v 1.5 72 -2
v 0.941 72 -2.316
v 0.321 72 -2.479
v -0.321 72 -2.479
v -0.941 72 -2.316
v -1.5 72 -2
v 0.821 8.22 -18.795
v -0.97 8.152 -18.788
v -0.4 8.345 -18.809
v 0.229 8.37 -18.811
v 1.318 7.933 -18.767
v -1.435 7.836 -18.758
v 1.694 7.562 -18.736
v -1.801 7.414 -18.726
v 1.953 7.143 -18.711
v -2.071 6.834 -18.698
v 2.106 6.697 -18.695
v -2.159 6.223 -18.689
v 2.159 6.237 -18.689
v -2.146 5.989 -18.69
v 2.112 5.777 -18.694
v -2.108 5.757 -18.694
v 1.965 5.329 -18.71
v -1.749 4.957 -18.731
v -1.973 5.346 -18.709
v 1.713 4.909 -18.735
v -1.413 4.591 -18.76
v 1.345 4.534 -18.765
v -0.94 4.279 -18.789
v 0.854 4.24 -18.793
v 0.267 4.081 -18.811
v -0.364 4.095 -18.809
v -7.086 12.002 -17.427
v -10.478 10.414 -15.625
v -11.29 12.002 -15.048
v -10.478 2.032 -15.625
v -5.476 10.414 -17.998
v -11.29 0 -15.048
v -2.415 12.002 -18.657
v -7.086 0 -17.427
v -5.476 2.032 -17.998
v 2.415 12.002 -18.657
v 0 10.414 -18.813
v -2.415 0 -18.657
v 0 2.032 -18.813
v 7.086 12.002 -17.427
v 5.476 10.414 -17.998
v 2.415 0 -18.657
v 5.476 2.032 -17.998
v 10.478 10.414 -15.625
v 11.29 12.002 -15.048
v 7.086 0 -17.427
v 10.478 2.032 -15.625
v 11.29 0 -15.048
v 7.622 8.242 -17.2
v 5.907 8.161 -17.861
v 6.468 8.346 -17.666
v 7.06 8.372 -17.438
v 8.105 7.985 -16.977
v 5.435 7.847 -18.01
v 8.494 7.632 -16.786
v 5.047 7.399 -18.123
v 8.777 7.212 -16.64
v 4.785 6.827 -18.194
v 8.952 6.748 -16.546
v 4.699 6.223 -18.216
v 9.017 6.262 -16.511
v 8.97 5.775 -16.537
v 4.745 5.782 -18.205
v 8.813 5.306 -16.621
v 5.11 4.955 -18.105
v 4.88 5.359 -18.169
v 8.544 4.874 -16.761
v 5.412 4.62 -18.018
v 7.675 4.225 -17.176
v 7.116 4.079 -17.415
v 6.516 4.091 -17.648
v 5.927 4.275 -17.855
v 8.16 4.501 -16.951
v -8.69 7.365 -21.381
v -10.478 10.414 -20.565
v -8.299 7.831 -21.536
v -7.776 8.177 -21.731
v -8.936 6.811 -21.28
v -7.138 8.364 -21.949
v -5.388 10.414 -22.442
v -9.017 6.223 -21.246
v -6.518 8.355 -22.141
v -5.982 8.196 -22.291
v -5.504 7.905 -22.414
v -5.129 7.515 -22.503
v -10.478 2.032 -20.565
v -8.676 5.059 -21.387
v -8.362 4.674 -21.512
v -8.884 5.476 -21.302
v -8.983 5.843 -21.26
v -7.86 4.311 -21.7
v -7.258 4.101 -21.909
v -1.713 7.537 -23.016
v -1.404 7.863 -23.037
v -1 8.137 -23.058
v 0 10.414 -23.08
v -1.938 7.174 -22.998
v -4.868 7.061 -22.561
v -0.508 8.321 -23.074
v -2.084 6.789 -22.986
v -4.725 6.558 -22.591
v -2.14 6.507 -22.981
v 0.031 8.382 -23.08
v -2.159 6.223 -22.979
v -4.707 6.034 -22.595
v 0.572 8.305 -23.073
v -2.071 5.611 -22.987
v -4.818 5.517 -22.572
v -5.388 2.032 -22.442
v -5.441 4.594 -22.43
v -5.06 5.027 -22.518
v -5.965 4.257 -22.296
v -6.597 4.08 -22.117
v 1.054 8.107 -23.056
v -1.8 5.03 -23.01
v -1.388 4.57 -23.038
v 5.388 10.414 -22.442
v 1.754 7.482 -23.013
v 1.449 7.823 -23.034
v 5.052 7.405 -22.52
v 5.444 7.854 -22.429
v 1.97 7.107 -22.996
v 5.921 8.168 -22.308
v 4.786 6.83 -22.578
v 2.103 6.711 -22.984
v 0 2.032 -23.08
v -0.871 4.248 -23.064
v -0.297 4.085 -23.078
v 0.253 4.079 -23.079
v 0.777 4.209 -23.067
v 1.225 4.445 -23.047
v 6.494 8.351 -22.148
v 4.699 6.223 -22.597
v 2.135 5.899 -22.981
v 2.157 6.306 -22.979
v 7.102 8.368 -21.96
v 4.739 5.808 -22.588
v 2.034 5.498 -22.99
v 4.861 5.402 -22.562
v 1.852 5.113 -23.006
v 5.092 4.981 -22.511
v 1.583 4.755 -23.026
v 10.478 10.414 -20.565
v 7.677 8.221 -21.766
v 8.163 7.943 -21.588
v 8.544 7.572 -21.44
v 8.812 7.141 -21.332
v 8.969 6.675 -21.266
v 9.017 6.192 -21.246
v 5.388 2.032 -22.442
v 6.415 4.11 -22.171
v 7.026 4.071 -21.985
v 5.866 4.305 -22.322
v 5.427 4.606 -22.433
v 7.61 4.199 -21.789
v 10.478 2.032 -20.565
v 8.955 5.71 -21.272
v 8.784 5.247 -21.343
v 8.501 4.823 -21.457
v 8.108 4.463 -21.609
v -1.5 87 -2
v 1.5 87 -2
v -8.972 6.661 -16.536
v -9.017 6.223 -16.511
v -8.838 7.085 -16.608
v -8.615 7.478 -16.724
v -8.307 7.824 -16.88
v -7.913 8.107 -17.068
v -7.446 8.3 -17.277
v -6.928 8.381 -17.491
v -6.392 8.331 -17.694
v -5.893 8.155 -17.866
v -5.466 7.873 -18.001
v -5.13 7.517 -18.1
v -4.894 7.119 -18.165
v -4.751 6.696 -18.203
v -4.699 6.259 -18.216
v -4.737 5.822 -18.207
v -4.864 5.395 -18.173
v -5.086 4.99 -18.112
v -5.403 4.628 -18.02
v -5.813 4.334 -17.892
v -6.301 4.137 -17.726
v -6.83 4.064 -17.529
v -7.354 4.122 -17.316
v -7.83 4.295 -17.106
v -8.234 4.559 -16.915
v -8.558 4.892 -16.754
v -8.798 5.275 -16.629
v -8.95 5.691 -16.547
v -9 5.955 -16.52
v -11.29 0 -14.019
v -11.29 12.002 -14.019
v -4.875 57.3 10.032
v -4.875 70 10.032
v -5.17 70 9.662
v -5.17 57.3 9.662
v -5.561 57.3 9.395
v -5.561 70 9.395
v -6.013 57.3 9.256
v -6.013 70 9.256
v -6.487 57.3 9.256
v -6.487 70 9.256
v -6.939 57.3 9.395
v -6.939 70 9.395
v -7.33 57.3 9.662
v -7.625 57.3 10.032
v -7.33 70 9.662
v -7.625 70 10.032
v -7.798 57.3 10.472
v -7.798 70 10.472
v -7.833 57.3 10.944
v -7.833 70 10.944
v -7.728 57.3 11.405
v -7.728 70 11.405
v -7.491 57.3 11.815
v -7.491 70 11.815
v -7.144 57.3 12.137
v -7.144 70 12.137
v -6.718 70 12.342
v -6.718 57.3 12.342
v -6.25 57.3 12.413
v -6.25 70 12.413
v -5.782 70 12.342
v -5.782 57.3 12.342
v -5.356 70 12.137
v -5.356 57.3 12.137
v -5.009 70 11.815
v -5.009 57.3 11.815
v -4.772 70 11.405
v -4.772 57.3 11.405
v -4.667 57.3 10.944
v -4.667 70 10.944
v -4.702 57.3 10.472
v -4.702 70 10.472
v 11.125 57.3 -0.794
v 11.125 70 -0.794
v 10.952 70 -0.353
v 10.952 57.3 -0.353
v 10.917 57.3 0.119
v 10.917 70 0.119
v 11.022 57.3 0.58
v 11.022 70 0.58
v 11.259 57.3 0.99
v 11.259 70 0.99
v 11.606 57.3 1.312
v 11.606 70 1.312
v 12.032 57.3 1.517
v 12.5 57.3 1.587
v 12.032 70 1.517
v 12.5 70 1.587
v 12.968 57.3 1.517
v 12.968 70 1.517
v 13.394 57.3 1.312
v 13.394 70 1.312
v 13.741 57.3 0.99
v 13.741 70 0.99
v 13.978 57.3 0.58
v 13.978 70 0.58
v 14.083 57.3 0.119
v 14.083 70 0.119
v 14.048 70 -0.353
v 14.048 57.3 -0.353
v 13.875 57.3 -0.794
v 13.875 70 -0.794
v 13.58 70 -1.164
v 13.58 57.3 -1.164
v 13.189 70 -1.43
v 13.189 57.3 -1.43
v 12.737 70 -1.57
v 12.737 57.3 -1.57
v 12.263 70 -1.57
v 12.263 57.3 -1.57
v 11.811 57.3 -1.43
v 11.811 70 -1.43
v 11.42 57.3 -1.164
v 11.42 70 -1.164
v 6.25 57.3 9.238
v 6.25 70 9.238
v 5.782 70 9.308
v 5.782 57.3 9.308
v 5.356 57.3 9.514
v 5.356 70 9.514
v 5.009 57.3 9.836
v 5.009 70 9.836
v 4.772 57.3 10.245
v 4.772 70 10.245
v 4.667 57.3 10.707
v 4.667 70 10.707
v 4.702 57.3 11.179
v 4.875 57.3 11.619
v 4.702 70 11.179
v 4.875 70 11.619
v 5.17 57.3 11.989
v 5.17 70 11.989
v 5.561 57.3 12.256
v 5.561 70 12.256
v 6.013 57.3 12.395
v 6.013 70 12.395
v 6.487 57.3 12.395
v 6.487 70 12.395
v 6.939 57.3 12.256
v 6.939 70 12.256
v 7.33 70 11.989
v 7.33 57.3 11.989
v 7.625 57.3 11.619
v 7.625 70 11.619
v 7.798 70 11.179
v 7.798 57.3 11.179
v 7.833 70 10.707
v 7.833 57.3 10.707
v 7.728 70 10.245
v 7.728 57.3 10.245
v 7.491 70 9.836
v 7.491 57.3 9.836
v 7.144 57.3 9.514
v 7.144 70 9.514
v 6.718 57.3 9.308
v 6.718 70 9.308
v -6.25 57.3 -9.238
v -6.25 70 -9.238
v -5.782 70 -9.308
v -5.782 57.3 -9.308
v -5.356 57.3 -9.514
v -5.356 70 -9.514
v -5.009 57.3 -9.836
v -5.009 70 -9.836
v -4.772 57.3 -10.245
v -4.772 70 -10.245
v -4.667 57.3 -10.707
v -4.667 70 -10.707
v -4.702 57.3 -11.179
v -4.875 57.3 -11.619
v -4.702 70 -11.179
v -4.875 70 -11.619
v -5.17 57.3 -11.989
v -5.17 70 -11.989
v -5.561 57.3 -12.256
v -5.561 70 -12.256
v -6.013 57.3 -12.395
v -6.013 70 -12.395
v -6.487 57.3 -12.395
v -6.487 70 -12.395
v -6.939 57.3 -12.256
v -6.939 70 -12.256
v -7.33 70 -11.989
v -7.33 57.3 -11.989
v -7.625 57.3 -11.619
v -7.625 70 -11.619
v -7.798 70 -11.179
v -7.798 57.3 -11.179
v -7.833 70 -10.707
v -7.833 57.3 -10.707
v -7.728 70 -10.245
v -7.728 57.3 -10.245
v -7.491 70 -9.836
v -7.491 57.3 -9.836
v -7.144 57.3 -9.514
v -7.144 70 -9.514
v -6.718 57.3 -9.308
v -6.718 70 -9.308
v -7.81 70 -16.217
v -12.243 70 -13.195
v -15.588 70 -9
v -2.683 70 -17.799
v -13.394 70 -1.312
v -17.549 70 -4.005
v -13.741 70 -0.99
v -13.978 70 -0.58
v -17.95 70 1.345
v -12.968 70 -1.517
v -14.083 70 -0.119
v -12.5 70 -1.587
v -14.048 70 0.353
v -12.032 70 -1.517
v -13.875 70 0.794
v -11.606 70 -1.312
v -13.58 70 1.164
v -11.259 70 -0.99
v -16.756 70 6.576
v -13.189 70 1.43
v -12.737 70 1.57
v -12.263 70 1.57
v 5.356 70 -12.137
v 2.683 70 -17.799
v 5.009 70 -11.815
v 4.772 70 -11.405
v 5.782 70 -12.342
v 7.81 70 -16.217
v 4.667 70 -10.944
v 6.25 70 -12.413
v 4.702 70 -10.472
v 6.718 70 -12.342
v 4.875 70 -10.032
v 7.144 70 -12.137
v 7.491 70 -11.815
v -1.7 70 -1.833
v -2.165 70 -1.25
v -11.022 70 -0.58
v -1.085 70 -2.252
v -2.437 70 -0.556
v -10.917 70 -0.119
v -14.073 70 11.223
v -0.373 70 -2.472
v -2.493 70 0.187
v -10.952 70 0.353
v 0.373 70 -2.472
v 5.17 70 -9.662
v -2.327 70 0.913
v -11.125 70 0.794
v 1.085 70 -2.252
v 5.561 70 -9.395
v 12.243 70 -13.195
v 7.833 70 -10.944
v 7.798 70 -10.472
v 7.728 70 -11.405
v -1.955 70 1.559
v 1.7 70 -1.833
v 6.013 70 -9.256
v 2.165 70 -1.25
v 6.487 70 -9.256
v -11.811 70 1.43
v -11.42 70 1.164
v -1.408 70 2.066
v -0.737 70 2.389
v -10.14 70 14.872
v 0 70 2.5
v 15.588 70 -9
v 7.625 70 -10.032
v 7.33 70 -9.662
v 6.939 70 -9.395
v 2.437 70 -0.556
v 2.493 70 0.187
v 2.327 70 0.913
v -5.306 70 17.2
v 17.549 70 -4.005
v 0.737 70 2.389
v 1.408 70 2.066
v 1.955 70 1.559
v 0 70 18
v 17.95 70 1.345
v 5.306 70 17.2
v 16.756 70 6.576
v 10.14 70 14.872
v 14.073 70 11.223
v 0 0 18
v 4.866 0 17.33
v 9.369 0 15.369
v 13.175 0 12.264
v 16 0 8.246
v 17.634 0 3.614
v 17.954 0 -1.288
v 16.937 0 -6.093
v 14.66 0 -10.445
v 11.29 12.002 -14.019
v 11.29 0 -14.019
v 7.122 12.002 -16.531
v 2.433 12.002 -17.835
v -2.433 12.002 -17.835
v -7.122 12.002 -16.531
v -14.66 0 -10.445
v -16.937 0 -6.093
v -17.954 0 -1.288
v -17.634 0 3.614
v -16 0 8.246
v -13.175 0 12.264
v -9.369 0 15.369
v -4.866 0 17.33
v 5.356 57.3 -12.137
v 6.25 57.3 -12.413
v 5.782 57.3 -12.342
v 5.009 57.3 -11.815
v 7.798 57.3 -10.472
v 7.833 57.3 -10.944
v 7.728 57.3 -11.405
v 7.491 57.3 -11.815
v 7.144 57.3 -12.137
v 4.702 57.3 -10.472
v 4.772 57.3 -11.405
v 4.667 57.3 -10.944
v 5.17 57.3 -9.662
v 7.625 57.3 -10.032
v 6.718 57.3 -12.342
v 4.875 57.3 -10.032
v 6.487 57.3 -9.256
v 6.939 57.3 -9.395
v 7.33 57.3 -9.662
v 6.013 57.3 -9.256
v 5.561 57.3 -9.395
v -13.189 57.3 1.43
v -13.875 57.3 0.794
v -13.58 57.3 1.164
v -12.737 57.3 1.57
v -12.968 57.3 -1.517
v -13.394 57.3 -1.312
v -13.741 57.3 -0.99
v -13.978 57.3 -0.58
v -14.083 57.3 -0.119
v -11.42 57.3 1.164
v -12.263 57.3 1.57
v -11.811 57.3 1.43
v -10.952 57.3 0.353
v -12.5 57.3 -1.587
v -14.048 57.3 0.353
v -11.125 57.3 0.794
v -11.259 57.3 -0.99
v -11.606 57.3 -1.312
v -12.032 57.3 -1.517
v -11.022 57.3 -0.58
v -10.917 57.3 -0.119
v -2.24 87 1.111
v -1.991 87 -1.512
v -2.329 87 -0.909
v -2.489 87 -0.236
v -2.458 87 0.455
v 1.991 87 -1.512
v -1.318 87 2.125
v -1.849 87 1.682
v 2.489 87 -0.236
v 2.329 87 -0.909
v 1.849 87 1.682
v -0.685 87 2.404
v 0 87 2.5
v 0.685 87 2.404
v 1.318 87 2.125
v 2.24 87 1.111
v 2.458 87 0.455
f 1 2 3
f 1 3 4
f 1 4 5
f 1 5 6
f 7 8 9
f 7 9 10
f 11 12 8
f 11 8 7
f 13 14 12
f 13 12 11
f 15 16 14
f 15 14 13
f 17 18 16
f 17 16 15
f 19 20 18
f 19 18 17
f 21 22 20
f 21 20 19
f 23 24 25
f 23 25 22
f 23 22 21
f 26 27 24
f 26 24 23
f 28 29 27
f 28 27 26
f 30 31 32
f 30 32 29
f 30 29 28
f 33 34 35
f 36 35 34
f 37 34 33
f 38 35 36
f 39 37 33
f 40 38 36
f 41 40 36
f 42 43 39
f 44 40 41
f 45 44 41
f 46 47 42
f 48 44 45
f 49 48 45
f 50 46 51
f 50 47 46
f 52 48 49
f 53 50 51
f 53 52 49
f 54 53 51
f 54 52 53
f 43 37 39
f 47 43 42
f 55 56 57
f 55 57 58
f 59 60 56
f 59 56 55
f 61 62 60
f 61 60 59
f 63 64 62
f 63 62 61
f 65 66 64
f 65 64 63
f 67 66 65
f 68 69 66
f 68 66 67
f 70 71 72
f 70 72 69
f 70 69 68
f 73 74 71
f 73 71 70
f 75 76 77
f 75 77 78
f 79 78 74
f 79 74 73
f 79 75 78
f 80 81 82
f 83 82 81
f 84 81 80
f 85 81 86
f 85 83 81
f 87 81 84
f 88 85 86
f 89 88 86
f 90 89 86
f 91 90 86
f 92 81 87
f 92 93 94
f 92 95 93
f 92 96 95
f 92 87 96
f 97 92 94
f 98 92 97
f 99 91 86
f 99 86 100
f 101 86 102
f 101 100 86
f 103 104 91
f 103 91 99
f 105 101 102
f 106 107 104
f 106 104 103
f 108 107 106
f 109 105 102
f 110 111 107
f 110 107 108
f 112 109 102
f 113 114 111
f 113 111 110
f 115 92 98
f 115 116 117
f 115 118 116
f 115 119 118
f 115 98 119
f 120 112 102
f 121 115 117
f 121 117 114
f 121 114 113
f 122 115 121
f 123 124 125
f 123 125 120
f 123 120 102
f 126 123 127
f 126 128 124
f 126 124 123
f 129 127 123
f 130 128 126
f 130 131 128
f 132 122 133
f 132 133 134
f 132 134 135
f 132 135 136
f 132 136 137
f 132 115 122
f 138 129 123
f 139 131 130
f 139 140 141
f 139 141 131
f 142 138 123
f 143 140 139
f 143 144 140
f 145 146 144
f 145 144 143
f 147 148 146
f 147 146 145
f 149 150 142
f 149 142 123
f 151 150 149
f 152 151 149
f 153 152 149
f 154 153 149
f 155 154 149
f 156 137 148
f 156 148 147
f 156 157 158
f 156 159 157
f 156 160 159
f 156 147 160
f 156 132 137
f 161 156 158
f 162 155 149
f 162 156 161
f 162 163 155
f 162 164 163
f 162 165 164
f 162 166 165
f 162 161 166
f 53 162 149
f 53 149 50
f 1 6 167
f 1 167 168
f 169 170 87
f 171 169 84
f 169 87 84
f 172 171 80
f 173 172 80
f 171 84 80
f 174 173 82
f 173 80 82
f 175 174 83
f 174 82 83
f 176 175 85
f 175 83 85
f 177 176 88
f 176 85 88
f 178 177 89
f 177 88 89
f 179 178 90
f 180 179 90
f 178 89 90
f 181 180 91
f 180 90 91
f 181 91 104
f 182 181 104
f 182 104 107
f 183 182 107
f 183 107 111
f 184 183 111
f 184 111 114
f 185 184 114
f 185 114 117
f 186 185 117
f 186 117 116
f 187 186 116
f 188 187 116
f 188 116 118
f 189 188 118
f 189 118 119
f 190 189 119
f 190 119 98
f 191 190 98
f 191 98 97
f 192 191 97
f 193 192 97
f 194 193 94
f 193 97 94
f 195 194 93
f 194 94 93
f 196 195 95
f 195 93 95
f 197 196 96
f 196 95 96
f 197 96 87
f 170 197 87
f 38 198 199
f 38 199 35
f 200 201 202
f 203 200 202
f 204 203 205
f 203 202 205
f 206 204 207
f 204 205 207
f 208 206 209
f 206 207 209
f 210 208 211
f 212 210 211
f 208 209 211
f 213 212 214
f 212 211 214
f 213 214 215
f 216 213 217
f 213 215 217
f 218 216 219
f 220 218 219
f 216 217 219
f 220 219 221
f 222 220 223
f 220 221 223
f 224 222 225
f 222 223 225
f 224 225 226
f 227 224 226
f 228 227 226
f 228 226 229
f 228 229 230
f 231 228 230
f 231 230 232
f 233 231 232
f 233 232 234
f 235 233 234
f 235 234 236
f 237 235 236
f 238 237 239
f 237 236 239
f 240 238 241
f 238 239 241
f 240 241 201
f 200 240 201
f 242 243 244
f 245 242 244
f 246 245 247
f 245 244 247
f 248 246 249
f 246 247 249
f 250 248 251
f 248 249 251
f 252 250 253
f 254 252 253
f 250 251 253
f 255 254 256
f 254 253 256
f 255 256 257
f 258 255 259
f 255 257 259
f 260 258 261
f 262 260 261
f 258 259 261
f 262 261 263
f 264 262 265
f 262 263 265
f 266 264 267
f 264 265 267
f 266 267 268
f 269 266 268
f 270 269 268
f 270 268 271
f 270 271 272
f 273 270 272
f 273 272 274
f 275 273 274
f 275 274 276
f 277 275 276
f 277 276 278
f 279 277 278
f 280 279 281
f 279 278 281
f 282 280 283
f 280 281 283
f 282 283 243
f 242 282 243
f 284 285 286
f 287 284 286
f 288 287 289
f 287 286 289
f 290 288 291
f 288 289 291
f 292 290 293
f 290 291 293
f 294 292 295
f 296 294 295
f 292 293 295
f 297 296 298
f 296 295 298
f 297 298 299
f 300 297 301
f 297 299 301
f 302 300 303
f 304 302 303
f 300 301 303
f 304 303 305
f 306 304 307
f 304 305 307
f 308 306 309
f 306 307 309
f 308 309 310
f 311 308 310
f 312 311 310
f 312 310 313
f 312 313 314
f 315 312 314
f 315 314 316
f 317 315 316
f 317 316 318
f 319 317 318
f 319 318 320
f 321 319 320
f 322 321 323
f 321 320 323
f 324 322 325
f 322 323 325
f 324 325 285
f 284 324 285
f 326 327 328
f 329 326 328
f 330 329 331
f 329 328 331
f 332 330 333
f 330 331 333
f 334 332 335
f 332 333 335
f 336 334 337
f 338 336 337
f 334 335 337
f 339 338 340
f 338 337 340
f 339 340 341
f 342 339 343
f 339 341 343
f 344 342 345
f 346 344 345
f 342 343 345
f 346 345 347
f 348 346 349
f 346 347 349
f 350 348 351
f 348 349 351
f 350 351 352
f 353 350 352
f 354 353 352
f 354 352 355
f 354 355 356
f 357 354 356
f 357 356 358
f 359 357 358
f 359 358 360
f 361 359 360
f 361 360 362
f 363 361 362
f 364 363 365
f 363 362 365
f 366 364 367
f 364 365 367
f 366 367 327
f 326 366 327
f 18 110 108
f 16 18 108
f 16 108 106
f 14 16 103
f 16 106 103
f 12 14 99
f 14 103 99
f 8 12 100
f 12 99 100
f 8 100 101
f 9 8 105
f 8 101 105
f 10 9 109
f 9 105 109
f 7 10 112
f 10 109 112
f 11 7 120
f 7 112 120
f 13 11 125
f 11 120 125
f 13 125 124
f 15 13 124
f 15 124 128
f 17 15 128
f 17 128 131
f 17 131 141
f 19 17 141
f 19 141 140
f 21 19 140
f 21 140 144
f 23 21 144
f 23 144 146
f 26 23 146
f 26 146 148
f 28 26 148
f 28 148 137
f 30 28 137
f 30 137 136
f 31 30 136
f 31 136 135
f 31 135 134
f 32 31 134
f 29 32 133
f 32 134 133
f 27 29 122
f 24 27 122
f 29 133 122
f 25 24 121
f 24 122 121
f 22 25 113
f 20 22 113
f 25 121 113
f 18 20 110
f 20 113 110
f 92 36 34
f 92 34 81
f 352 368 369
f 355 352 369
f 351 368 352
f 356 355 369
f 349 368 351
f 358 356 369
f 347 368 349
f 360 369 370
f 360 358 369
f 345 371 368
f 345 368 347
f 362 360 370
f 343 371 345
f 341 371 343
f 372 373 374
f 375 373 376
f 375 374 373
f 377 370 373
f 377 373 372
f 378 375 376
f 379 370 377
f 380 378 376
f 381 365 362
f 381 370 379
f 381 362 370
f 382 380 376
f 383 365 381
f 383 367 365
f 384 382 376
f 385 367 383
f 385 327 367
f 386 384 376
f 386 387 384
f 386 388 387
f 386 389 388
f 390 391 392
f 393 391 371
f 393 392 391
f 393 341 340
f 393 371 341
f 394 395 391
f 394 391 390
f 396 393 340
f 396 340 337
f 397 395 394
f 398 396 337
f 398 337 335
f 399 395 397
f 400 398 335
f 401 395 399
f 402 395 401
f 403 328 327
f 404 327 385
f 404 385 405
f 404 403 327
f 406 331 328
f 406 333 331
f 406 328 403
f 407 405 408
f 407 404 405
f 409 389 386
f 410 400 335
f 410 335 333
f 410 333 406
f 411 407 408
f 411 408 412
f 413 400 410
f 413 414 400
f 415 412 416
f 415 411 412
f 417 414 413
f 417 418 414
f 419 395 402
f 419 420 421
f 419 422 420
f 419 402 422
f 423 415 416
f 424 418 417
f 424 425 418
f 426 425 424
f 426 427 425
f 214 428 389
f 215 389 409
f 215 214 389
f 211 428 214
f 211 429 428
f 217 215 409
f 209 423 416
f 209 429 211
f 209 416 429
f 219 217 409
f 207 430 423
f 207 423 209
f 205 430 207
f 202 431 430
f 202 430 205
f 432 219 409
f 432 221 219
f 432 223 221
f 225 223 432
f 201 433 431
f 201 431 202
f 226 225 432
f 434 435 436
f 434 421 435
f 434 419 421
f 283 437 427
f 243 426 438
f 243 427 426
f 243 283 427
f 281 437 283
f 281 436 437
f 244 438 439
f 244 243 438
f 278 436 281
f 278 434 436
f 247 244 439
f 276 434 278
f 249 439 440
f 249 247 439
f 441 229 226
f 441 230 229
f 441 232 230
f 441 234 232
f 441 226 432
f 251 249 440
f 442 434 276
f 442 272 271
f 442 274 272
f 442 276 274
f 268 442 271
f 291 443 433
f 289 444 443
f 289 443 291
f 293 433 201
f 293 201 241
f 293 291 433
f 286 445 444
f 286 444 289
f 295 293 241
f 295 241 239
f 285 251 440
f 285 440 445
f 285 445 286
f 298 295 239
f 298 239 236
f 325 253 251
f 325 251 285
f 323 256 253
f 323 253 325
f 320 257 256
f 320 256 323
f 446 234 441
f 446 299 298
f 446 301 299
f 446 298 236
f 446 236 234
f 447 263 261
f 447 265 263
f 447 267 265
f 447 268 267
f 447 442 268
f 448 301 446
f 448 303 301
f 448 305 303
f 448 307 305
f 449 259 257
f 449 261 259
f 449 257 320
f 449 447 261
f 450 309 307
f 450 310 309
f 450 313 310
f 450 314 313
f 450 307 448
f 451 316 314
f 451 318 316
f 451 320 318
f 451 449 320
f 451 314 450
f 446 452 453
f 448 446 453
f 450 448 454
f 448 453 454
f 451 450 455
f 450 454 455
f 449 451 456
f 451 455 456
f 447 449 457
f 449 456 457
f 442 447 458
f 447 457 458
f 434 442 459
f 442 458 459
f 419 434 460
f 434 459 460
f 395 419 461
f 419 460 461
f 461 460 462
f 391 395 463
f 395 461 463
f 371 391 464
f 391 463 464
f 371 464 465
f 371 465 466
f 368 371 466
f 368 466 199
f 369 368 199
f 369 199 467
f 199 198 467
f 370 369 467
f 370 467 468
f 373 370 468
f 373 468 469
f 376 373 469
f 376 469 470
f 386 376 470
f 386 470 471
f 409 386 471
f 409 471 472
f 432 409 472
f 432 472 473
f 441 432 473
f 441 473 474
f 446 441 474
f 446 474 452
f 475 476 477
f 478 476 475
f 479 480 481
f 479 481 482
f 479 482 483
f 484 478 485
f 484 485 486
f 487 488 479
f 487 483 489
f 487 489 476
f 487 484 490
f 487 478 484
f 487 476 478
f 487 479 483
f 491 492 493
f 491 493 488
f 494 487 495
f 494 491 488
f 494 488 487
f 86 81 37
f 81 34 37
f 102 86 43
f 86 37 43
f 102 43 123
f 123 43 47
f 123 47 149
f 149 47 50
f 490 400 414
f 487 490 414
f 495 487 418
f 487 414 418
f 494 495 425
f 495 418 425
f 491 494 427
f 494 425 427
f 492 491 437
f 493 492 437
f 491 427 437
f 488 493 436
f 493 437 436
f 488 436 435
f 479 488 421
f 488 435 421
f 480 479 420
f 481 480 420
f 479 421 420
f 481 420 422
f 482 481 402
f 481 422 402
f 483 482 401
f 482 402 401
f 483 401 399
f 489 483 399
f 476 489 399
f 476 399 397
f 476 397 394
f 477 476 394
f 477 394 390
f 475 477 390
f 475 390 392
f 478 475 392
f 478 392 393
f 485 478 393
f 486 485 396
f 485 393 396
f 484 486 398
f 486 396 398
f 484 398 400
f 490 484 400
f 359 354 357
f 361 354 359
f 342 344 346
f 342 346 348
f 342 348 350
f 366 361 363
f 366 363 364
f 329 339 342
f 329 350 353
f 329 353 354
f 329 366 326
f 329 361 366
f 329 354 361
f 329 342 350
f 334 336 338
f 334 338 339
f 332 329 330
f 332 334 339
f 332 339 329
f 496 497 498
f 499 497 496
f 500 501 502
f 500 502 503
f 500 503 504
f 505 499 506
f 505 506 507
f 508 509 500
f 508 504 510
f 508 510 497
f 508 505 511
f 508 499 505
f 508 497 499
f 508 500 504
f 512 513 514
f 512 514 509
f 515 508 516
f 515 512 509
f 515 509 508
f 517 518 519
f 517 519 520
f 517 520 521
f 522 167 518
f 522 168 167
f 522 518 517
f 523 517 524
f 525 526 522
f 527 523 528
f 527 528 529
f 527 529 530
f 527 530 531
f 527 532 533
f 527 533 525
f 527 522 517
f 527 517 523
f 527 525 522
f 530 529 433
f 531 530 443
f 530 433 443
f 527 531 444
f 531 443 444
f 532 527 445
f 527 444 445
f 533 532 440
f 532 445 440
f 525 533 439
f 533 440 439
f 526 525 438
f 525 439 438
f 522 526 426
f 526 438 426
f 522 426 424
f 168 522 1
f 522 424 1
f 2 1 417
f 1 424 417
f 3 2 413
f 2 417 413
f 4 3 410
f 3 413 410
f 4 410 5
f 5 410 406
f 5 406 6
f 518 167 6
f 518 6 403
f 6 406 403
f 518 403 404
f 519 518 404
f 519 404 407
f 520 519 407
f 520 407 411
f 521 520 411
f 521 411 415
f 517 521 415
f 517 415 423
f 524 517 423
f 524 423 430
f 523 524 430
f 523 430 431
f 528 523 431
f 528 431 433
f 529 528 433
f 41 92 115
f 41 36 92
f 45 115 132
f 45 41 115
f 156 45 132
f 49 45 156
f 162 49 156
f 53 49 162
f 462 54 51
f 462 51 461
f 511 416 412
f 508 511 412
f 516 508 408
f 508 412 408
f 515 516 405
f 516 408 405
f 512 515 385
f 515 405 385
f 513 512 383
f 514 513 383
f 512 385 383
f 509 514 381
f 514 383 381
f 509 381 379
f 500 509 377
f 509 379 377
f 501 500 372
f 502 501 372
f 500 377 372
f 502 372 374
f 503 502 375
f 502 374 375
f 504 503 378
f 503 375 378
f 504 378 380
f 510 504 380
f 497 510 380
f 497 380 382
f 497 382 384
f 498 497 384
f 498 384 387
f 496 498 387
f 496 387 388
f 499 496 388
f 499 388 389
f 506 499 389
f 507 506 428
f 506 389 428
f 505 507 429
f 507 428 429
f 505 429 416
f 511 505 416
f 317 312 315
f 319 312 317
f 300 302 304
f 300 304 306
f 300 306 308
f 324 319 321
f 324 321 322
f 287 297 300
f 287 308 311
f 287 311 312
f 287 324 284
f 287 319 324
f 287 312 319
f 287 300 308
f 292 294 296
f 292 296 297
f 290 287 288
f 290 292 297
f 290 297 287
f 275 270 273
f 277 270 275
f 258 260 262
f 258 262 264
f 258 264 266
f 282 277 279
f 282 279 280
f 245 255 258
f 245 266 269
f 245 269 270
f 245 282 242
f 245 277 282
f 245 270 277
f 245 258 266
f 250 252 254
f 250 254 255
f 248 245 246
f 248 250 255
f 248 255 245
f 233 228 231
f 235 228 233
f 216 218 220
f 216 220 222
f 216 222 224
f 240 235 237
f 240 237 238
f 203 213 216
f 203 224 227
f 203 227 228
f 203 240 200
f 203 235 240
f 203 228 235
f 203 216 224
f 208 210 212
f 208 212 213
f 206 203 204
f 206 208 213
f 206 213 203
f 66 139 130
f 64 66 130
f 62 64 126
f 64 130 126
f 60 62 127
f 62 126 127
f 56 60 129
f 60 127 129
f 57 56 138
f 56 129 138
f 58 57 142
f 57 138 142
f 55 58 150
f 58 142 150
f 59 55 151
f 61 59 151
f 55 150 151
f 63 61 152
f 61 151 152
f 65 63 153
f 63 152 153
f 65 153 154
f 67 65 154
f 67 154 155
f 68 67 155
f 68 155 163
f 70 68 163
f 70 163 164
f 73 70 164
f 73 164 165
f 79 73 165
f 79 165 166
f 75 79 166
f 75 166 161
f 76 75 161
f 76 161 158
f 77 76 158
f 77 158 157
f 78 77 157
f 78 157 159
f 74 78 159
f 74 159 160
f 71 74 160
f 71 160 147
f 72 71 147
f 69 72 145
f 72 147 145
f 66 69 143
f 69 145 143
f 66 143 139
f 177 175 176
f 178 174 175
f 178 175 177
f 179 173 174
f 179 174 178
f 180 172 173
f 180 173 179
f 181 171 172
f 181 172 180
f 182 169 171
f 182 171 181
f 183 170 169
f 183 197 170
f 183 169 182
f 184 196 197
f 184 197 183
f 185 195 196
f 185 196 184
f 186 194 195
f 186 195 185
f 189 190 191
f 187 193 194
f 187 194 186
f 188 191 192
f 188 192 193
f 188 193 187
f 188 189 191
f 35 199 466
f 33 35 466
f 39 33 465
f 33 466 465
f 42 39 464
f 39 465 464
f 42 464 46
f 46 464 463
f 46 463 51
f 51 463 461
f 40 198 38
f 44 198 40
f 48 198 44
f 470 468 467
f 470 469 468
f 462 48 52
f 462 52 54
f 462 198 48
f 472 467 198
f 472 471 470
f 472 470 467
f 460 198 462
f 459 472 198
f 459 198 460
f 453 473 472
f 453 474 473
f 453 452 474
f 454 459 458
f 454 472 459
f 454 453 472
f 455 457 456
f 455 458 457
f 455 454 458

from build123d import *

# Parameters (mm, degrees)
SKETCH1_R               = 18
BOSS_EXTRUDE1_DEPTH     = 70
SKETCH2_R               = 2.5
BOSS_EXTRUDE2_DEPTH     = 17
CUT_EXTRUDE1_START      = -15
CUT_EXTRUDE1_DEPTH      = 15
SKETCH4_R               = 1.5875
CUT_EXTRUDE2_DEPTH      = 12.7
CIRPATTERN1_COUNT       = 6
BOSS_EXTRUDE3_START     = -2.032
BOSS_EXTRUDE3_DEPTH     = 8.382
BOSS_EXTRUDE4_DEPTH     = 12.0015
CUT_EXTRUDE3_REACH      = 99.88
CUT_EXTRUDE3_END_RADIUS = 18.8128
SKETCH7_R               = 2.159


with BuildPart() as part:
    # Sketch1 → Boss-Extrude1 (new body)
    with BuildSketch(Plane(origin=(0, 0, 0), x_dir=(1, 0, 0), z_dir=(0, 1, 0))):
        with Locations(Location((0, 0, 0), (0, 0, 270))):
            Circle(SKETCH1_R)
    extrude(amount=BOSS_EXTRUDE1_DEPTH)

    # Sketch2 → Boss-Extrude2 (add)
    with BuildSketch(Plane(origin=(0, 70, 0), x_dir=(1, 0, 0), z_dir=(0, 1, 0))):
        with Locations(Location((0, 0, 0), (0, 0, 270))):
            Circle(SKETCH2_R)
    extrude(amount=BOSS_EXTRUDE2_DEPTH)

    # Sketch3 → Cut-Extrude1 (cut)
    with BuildSketch(Plane(origin=(0, 87, 0), x_dir=(1, 0, 0), z_dir=(0, 1, 0)).offset(CUT_EXTRUDE1_START)):
        with BuildLine():
            Line((-1.5, 2), (1.5, 2))
            ThreePointArc((1.5, 2), (0, 2.5), (-1.5, 2))
        make_face()
    extrude(amount=CUT_EXTRUDE1_DEPTH, mode=Mode.SUBTRACT)

    # Sketch4 → Cut-Extrude2 (cut)
    with BuildSketch(Plane(origin=(0, 70, 0), x_dir=(1, 0, 0), z_dir=(0, 1, 0))):
        with Locations(Location((-6.25, 10.825317547, 0), (0, 0, 270))):
            Circle(SKETCH4_R)
    cut_extrude2 = extrude(amount=-CUT_EXTRUDE2_DEPTH, mode=Mode.SUBTRACT)

    # CirPattern1: Cut-Extrude2 ×6 about axis
    cirpattern1_axis = Axis((0, 0, 0), (0, 1, 0))
    for i in range(1, CIRPATTERN1_COUNT):
        add(cut_extrude2.rotate(cirpattern1_axis, i * 360 / CIRPATTERN1_COUNT), mode=Mode.SUBTRACT)

    # Sketch5 → Boss-Extrude3 (add)
    with BuildSketch(Plane.XZ.offset(BOSS_EXTRUDE3_START)):
        with BuildLine():
            Line((10.4775, -20.564736656), (10.4775, -14.636324462))
            ThreePointArc((10.4775, -14.636324462), (0, -18), (-10.4775, -14.636324462))
            Line((-10.4775, -14.636324462), (-10.4775, -20.564736656))
            ThreePointArc((-10.4775, -20.564736656), (0, -23.08), (10.4775, -20.564736656))
        make_face()
    extrude(amount=-BOSS_EXTRUDE3_DEPTH)

    # Sketch6 → Boss-Extrude4 (add)
    with BuildSketch(Plane.XZ):
        with BuildLine():
            Line((-11.2903, -14.018884617), (-11.2903, -15.048274644))
            ThreePointArc((-11.2903, -15.048274644), (0, -18.8128), (11.2903, -15.048274644))
            Line((11.2903, -15.048274644), (11.2903, -14.018884617))
            ThreePointArc((11.2903, -14.018884617), (0, -18), (-11.2903, -14.018884617))
        make_face()
    extrude(amount=-BOSS_EXTRUDE4_DEPTH)

    # Cut-Extrude3: up to this cylinder (the profile starts outside it)
    cut_extrude3_end = Plane(origin=(0, 6.223, 0), z_dir=(0, -1, 0)) * Cylinder(CUT_EXTRUDE3_END_RADIUS, 238.3856, mode=Mode.PRIVATE)
    # Sketch7 → Cut-Extrude3 (cut, up to the surface)
    with BuildSketch(Plane(origin=(0, 0, -23.08), x_dir=(-1, 0, 0), z_dir=(0, 0, -1)), mode=Mode.PRIVATE) as cut_extrude3_sk1:
        with Locations((-6.858, 6.223)):
            Circle(SKETCH7_R)
    cut_extrude3_tool1 = extrude(cut_extrude3_sk1.sketch, amount=-CUT_EXTRUDE3_REACH, mode=Mode.PRIVATE) - cut_extrude3_end
    add(cut_extrude3_tool1.solids().sort_by_distance((6.858, 6.223, -23.08))[0], mode=Mode.SUBTRACT)
    # Sketch7 → Cut-Extrude3 (cut, up to the surface)
    with BuildSketch(Plane(origin=(0, 0, -23.08), x_dir=(-1, 0, 0), z_dir=(0, 0, -1)), mode=Mode.PRIVATE) as cut_extrude3_sk2:
        with Locations((0, 6.223)):
            Circle(SKETCH7_R)
    cut_extrude3_tool2 = extrude(cut_extrude3_sk2.sketch, amount=-CUT_EXTRUDE3_REACH, mode=Mode.PRIVATE) - cut_extrude3_end
    add(cut_extrude3_tool2.solids().sort_by_distance((0, 6.223, -23.08))[0], mode=Mode.SUBTRACT)
    # Sketch7 → Cut-Extrude3 (cut, up to the surface)
    with BuildSketch(Plane(origin=(0, 0, -23.08), x_dir=(-1, 0, 0), z_dir=(0, 0, -1)), mode=Mode.PRIVATE) as cut_extrude3_sk3:
        with Locations((6.858, 6.223)):
            Circle(SKETCH7_R)
    cut_extrude3_tool3 = extrude(cut_extrude3_sk3.sketch, amount=-CUT_EXTRUDE3_REACH, mode=Mode.PRIVATE) - cut_extrude3_end
    add(cut_extrude3_tool3.solids().sort_by_distance((-6.858, 6.223, -23.08))[0], mode=Mode.SUBTRACT)


solid = part.part
